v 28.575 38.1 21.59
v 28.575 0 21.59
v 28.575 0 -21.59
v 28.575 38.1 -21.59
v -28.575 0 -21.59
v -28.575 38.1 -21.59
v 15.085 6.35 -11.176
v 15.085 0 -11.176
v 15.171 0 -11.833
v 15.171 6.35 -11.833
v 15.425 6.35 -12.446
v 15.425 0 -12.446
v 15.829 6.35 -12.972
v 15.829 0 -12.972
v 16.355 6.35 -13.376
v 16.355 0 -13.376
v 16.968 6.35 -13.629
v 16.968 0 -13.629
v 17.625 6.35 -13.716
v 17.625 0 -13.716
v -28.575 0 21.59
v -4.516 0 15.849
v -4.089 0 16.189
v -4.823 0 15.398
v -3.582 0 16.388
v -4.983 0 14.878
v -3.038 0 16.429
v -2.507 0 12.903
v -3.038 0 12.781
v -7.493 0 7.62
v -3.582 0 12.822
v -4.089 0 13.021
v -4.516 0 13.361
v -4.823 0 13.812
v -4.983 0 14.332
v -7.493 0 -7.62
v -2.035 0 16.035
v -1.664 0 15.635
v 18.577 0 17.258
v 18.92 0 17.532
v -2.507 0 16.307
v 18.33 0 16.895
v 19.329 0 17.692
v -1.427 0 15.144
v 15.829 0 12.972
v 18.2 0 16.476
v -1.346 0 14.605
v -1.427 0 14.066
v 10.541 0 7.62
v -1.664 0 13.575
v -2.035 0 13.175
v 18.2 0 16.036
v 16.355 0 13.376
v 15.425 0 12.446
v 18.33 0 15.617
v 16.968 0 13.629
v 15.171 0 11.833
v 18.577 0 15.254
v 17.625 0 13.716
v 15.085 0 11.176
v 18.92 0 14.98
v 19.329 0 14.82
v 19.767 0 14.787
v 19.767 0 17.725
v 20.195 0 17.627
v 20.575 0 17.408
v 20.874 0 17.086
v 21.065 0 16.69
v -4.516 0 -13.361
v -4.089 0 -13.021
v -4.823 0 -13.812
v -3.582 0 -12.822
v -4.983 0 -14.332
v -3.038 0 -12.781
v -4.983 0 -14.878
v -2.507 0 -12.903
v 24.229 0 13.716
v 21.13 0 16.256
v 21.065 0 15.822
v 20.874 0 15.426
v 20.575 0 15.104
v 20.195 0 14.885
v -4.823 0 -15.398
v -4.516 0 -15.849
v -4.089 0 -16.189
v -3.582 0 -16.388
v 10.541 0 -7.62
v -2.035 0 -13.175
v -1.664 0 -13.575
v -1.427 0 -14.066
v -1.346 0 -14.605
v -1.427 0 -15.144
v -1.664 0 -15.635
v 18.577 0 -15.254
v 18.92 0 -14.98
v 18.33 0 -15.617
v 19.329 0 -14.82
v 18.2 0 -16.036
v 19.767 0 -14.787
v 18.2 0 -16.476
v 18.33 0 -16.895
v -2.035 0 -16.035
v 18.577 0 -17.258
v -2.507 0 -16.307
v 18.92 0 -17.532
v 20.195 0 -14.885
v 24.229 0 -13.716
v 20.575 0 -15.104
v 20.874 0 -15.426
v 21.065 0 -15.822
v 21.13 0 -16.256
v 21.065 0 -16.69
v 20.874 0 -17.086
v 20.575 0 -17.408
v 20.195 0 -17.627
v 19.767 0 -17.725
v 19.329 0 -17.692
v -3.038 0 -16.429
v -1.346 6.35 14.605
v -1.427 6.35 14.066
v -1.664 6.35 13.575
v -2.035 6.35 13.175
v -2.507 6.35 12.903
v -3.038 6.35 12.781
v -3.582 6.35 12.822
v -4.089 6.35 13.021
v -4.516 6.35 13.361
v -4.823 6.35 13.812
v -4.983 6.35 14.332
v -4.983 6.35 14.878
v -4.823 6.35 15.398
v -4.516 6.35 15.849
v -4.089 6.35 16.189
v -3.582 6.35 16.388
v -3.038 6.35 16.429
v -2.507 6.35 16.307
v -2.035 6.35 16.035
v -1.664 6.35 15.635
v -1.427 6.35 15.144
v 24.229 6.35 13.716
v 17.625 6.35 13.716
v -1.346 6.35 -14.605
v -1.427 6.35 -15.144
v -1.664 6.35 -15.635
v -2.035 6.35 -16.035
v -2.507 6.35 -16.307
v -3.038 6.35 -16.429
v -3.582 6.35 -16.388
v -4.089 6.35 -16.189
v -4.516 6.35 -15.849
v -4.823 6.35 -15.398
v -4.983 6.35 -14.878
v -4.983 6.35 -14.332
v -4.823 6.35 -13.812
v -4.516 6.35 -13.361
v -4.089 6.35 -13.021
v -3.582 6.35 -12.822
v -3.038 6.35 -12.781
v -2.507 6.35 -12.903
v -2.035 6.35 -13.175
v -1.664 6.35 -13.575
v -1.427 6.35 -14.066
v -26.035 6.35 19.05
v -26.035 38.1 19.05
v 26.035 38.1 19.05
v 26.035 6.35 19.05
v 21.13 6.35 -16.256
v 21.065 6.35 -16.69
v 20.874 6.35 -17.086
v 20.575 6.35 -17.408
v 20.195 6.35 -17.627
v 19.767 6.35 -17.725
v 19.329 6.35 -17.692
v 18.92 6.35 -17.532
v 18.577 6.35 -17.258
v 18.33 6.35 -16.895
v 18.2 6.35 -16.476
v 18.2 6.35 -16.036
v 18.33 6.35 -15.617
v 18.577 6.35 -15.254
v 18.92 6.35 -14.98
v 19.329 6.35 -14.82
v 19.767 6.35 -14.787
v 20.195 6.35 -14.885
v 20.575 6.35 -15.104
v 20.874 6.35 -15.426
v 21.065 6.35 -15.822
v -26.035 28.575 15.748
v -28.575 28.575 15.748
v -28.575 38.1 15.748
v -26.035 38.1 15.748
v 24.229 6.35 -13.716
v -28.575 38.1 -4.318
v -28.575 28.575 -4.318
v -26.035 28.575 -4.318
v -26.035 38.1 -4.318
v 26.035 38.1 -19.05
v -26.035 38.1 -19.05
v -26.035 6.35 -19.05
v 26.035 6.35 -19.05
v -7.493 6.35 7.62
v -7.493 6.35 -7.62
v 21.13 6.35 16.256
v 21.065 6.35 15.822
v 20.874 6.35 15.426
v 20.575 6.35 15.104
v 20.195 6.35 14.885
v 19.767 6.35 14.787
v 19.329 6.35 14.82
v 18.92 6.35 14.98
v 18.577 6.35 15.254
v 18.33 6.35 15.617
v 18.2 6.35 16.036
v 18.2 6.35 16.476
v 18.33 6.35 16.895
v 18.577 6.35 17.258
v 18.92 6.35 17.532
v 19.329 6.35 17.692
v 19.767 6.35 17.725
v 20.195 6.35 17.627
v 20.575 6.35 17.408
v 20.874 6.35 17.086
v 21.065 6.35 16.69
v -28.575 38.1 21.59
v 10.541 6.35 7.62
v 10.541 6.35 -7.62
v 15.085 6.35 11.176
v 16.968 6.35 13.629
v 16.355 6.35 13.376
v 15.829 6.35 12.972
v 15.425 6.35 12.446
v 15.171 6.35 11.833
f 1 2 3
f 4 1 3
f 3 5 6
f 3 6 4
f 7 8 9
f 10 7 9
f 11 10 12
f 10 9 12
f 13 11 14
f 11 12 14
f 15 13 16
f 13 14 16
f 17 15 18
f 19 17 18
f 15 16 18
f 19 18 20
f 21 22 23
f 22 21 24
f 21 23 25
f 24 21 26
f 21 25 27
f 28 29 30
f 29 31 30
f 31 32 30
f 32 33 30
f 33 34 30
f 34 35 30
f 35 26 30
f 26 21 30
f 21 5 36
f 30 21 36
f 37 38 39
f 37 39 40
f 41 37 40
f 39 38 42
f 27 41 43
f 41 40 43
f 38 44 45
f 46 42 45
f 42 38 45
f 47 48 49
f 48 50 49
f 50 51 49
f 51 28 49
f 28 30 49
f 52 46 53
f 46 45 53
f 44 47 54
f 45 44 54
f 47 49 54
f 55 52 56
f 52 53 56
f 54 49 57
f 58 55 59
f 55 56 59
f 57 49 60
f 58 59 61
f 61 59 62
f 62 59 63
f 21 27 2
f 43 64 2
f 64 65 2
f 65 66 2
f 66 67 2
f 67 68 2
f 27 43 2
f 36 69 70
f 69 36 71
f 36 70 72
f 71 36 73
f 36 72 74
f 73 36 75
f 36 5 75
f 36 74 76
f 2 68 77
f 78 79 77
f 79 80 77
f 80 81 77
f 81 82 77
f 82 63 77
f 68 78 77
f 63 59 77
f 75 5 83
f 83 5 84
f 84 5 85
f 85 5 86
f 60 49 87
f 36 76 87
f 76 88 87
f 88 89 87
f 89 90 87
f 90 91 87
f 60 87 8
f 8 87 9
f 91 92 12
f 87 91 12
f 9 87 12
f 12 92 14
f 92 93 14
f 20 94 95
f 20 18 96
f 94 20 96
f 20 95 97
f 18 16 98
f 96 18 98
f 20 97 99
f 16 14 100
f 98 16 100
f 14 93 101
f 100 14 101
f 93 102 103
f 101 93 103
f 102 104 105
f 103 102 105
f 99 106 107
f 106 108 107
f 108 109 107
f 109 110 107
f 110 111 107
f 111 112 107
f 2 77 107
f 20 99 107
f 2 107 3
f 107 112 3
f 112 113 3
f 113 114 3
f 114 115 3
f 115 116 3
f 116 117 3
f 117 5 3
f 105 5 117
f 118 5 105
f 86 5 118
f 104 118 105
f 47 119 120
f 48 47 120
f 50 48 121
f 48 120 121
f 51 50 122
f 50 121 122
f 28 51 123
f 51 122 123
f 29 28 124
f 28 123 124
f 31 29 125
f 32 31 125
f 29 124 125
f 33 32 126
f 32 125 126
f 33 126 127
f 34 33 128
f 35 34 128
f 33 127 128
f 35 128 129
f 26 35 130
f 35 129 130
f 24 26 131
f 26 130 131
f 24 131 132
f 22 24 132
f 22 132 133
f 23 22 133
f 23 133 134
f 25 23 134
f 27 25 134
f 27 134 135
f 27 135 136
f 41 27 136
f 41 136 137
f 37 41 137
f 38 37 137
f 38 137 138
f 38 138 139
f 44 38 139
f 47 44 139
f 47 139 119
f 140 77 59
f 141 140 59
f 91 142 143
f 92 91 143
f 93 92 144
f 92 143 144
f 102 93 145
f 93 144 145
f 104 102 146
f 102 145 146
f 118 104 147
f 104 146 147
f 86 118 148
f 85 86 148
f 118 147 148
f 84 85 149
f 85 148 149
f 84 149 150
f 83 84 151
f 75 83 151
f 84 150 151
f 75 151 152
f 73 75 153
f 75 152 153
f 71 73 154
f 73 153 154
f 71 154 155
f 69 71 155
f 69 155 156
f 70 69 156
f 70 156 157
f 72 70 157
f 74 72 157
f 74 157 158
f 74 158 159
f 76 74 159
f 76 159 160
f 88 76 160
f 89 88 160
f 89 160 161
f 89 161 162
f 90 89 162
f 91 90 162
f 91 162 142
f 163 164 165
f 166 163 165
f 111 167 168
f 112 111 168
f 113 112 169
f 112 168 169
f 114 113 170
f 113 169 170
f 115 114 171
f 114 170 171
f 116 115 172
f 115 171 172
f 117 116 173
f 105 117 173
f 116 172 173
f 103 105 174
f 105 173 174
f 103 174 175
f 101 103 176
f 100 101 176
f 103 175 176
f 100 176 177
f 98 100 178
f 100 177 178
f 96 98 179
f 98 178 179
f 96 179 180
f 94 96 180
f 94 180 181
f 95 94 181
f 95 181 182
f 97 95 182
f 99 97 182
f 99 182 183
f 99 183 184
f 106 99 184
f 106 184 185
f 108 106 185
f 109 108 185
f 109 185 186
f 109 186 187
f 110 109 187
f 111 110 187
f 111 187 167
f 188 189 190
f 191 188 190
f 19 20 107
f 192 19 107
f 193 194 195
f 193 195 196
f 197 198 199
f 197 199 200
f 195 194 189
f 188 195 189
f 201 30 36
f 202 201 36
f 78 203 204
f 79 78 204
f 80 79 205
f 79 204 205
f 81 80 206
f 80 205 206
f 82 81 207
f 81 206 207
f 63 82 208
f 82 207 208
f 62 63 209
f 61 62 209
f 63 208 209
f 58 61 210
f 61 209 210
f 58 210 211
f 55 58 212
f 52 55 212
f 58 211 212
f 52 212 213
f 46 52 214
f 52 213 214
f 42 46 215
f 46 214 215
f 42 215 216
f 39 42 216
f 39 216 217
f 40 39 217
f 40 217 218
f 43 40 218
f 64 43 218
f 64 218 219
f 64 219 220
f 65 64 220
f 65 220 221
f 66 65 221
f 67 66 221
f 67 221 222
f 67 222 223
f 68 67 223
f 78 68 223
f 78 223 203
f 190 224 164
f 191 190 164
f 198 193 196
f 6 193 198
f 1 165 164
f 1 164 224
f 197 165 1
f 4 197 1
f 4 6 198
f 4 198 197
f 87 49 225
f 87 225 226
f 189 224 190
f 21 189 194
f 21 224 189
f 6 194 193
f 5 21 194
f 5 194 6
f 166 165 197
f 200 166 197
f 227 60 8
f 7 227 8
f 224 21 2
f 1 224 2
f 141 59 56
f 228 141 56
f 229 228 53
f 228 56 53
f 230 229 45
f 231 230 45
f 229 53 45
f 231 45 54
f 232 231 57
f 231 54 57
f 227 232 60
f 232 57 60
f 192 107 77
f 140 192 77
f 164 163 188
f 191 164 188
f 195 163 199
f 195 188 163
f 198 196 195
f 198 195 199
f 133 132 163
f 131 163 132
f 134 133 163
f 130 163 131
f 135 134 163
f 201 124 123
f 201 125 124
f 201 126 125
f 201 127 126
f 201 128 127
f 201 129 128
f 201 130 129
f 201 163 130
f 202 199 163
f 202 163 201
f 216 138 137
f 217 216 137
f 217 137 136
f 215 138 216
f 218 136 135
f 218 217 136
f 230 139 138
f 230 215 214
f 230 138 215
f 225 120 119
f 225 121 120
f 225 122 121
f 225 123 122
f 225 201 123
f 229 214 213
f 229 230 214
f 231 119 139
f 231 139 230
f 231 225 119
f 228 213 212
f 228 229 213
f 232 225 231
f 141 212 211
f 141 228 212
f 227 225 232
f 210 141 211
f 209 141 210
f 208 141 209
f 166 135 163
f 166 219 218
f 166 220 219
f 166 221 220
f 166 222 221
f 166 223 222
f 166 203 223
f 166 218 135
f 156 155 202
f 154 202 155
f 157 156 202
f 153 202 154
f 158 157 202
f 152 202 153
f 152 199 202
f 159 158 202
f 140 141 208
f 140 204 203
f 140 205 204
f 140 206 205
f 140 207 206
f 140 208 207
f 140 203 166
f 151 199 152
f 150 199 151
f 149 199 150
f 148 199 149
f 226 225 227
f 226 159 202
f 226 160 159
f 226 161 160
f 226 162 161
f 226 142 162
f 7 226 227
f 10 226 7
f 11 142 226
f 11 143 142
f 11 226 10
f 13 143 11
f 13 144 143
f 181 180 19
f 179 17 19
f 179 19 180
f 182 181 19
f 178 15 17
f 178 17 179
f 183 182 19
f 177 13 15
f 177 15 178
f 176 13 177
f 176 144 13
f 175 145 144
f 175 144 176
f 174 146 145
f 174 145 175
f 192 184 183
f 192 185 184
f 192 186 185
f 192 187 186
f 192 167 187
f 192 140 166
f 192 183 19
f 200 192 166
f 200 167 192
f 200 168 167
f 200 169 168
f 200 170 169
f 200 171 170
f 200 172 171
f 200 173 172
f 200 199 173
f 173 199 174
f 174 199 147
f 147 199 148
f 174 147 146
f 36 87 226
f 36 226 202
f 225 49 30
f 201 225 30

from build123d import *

# Parameters (mm, degrees)
SKETCH1_W             = 57.15
SKETCH1_H             = 43.18
BOSS_EXTRUDE1_DEPTH   = 38.1
SKETCH2_W             = 52.07
SKETCH2_H             = 38.1
CUT_EXTRUDE1_DEPTH    = 31.75
SKETCH3_W             = 18.034
SKETCH3_H             = 15.24
CUT_EXTRUDE2_DEPTH    = 53.290235465
CUT_EXTRUDE3_REACH    = 73.999
SKETCH4_W             = 20.066
SKETCH4_H             = 9.525
CUT_EXTRUDE4_REACH    = 54.29
F_4_CLEARANCE_HOLE1_D = 2.9464
F_6_CLEARANCE_HOLE1_D = 3.6576


with BuildPart() as part:
    # Sketch1 → Boss-Extrude1 (new body)
    with BuildSketch(Plane(origin=(0, 0, 0), x_dir=(1, 0, 0), z_dir=(0, 1, 0))):
        Rectangle(SKETCH1_W, SKETCH1_H)
    extrude(amount=BOSS_EXTRUDE1_DEPTH)

    # Sketch2 → Cut-Extrude1 (cut)
    with BuildSketch(Plane(origin=(0, 38.1, 0), x_dir=(1, 0, 0), z_dir=(0, 1, 0))):
        Rectangle(SKETCH2_W, SKETCH2_H)
    extrude(amount=-CUT_EXTRUDE1_DEPTH, mode=Mode.SUBTRACT)

    # Sketch3 → Cut-Extrude2 (cut, through all)
    with BuildSketch(Plane(origin=(0, 0, 0), x_dir=(-1, 0, 0), z_dir=(0, -1, 0))):
        with Locations((-1.524, 0)):
            Rectangle(SKETCH3_W, SKETCH3_H)
    extrude(amount=-CUT_EXTRUDE2_DEPTH, mode=Mode.SUBTRACT)

    # Sketch4 → Cut-Extrude3 (cut, up to next)
    with BuildSketch(Plane.ZY.offset(28.575), mode=Mode.PRIVATE) as cut_extrude3_sk1:
        with Locations((5.715, 33.3375)):
            Rectangle(SKETCH4_W, SKETCH4_H)
    cut_extrude3_tool1 = extrude(cut_extrude3_sk1.sketch, amount=-CUT_EXTRUDE3_REACH, mode=Mode.PRIVATE) & part.part
    add(cut_extrude3_tool1.solids().sort_by_distance((-28.575, 33.3375, 5.715))[0], mode=Mode.SUBTRACT)

    # Sketch5 → Cut-Extrude4 (cut, up to next)
    with BuildSketch(Plane.XZ, mode=Mode.PRIVATE) as cut_extrude4_sk1:
        with BuildLine():
            Line((17.624947543, -13.716), (24.228947543, -13.716))
            Line((24.228947543, -13.716), (24.228947543, 13.716))
            Line((24.228947543, 13.716), (17.624947543, 13.716))
            ThreePointArc((17.624947543, 13.716), (15.828896319, 12.972051224), (15.084947543, 11.176))
            Line((15.084947543, 11.176), (15.084947543, -11.176))
            ThreePointArc((15.084947543, -11.176), (15.828896319, -12.972051224), (17.624947543, -13.716))
        make_face()
    cut_extrude4_tool1 = extrude(cut_extrude4_sk1.sketch, amount=-CUT_EXTRUDE4_REACH, mode=Mode.PRIVATE) & part.part
    add(cut_extrude4_tool1.solids().sort_by_distance((19.701649, 0, 0))[0], mode=Mode.SUBTRACT)

    # #4 Clearance Hole1 (through all)
    with Locations(Plane(origin=(0, 0, 0), x_dir=(-1, 0, 0), z_dir=(0, -1, 0))):
        with Locations((-19.656947543, 16.256), (-19.656947543, -16.256)):
            Hole(F_4_CLEARANCE_HOLE1_D / 2)

    # #6 Clearance Hole1 (through all)
    with Locations(Plane(origin=(0, 0, 0), x_dir=(-1, 0, 0), z_dir=(0, -1, 0))):
        with Locations((3.175, 14.605), (3.175, -14.605)):
            Hole(F_6_CLEARANCE_HOLE1_D / 2)


solid = part.part
